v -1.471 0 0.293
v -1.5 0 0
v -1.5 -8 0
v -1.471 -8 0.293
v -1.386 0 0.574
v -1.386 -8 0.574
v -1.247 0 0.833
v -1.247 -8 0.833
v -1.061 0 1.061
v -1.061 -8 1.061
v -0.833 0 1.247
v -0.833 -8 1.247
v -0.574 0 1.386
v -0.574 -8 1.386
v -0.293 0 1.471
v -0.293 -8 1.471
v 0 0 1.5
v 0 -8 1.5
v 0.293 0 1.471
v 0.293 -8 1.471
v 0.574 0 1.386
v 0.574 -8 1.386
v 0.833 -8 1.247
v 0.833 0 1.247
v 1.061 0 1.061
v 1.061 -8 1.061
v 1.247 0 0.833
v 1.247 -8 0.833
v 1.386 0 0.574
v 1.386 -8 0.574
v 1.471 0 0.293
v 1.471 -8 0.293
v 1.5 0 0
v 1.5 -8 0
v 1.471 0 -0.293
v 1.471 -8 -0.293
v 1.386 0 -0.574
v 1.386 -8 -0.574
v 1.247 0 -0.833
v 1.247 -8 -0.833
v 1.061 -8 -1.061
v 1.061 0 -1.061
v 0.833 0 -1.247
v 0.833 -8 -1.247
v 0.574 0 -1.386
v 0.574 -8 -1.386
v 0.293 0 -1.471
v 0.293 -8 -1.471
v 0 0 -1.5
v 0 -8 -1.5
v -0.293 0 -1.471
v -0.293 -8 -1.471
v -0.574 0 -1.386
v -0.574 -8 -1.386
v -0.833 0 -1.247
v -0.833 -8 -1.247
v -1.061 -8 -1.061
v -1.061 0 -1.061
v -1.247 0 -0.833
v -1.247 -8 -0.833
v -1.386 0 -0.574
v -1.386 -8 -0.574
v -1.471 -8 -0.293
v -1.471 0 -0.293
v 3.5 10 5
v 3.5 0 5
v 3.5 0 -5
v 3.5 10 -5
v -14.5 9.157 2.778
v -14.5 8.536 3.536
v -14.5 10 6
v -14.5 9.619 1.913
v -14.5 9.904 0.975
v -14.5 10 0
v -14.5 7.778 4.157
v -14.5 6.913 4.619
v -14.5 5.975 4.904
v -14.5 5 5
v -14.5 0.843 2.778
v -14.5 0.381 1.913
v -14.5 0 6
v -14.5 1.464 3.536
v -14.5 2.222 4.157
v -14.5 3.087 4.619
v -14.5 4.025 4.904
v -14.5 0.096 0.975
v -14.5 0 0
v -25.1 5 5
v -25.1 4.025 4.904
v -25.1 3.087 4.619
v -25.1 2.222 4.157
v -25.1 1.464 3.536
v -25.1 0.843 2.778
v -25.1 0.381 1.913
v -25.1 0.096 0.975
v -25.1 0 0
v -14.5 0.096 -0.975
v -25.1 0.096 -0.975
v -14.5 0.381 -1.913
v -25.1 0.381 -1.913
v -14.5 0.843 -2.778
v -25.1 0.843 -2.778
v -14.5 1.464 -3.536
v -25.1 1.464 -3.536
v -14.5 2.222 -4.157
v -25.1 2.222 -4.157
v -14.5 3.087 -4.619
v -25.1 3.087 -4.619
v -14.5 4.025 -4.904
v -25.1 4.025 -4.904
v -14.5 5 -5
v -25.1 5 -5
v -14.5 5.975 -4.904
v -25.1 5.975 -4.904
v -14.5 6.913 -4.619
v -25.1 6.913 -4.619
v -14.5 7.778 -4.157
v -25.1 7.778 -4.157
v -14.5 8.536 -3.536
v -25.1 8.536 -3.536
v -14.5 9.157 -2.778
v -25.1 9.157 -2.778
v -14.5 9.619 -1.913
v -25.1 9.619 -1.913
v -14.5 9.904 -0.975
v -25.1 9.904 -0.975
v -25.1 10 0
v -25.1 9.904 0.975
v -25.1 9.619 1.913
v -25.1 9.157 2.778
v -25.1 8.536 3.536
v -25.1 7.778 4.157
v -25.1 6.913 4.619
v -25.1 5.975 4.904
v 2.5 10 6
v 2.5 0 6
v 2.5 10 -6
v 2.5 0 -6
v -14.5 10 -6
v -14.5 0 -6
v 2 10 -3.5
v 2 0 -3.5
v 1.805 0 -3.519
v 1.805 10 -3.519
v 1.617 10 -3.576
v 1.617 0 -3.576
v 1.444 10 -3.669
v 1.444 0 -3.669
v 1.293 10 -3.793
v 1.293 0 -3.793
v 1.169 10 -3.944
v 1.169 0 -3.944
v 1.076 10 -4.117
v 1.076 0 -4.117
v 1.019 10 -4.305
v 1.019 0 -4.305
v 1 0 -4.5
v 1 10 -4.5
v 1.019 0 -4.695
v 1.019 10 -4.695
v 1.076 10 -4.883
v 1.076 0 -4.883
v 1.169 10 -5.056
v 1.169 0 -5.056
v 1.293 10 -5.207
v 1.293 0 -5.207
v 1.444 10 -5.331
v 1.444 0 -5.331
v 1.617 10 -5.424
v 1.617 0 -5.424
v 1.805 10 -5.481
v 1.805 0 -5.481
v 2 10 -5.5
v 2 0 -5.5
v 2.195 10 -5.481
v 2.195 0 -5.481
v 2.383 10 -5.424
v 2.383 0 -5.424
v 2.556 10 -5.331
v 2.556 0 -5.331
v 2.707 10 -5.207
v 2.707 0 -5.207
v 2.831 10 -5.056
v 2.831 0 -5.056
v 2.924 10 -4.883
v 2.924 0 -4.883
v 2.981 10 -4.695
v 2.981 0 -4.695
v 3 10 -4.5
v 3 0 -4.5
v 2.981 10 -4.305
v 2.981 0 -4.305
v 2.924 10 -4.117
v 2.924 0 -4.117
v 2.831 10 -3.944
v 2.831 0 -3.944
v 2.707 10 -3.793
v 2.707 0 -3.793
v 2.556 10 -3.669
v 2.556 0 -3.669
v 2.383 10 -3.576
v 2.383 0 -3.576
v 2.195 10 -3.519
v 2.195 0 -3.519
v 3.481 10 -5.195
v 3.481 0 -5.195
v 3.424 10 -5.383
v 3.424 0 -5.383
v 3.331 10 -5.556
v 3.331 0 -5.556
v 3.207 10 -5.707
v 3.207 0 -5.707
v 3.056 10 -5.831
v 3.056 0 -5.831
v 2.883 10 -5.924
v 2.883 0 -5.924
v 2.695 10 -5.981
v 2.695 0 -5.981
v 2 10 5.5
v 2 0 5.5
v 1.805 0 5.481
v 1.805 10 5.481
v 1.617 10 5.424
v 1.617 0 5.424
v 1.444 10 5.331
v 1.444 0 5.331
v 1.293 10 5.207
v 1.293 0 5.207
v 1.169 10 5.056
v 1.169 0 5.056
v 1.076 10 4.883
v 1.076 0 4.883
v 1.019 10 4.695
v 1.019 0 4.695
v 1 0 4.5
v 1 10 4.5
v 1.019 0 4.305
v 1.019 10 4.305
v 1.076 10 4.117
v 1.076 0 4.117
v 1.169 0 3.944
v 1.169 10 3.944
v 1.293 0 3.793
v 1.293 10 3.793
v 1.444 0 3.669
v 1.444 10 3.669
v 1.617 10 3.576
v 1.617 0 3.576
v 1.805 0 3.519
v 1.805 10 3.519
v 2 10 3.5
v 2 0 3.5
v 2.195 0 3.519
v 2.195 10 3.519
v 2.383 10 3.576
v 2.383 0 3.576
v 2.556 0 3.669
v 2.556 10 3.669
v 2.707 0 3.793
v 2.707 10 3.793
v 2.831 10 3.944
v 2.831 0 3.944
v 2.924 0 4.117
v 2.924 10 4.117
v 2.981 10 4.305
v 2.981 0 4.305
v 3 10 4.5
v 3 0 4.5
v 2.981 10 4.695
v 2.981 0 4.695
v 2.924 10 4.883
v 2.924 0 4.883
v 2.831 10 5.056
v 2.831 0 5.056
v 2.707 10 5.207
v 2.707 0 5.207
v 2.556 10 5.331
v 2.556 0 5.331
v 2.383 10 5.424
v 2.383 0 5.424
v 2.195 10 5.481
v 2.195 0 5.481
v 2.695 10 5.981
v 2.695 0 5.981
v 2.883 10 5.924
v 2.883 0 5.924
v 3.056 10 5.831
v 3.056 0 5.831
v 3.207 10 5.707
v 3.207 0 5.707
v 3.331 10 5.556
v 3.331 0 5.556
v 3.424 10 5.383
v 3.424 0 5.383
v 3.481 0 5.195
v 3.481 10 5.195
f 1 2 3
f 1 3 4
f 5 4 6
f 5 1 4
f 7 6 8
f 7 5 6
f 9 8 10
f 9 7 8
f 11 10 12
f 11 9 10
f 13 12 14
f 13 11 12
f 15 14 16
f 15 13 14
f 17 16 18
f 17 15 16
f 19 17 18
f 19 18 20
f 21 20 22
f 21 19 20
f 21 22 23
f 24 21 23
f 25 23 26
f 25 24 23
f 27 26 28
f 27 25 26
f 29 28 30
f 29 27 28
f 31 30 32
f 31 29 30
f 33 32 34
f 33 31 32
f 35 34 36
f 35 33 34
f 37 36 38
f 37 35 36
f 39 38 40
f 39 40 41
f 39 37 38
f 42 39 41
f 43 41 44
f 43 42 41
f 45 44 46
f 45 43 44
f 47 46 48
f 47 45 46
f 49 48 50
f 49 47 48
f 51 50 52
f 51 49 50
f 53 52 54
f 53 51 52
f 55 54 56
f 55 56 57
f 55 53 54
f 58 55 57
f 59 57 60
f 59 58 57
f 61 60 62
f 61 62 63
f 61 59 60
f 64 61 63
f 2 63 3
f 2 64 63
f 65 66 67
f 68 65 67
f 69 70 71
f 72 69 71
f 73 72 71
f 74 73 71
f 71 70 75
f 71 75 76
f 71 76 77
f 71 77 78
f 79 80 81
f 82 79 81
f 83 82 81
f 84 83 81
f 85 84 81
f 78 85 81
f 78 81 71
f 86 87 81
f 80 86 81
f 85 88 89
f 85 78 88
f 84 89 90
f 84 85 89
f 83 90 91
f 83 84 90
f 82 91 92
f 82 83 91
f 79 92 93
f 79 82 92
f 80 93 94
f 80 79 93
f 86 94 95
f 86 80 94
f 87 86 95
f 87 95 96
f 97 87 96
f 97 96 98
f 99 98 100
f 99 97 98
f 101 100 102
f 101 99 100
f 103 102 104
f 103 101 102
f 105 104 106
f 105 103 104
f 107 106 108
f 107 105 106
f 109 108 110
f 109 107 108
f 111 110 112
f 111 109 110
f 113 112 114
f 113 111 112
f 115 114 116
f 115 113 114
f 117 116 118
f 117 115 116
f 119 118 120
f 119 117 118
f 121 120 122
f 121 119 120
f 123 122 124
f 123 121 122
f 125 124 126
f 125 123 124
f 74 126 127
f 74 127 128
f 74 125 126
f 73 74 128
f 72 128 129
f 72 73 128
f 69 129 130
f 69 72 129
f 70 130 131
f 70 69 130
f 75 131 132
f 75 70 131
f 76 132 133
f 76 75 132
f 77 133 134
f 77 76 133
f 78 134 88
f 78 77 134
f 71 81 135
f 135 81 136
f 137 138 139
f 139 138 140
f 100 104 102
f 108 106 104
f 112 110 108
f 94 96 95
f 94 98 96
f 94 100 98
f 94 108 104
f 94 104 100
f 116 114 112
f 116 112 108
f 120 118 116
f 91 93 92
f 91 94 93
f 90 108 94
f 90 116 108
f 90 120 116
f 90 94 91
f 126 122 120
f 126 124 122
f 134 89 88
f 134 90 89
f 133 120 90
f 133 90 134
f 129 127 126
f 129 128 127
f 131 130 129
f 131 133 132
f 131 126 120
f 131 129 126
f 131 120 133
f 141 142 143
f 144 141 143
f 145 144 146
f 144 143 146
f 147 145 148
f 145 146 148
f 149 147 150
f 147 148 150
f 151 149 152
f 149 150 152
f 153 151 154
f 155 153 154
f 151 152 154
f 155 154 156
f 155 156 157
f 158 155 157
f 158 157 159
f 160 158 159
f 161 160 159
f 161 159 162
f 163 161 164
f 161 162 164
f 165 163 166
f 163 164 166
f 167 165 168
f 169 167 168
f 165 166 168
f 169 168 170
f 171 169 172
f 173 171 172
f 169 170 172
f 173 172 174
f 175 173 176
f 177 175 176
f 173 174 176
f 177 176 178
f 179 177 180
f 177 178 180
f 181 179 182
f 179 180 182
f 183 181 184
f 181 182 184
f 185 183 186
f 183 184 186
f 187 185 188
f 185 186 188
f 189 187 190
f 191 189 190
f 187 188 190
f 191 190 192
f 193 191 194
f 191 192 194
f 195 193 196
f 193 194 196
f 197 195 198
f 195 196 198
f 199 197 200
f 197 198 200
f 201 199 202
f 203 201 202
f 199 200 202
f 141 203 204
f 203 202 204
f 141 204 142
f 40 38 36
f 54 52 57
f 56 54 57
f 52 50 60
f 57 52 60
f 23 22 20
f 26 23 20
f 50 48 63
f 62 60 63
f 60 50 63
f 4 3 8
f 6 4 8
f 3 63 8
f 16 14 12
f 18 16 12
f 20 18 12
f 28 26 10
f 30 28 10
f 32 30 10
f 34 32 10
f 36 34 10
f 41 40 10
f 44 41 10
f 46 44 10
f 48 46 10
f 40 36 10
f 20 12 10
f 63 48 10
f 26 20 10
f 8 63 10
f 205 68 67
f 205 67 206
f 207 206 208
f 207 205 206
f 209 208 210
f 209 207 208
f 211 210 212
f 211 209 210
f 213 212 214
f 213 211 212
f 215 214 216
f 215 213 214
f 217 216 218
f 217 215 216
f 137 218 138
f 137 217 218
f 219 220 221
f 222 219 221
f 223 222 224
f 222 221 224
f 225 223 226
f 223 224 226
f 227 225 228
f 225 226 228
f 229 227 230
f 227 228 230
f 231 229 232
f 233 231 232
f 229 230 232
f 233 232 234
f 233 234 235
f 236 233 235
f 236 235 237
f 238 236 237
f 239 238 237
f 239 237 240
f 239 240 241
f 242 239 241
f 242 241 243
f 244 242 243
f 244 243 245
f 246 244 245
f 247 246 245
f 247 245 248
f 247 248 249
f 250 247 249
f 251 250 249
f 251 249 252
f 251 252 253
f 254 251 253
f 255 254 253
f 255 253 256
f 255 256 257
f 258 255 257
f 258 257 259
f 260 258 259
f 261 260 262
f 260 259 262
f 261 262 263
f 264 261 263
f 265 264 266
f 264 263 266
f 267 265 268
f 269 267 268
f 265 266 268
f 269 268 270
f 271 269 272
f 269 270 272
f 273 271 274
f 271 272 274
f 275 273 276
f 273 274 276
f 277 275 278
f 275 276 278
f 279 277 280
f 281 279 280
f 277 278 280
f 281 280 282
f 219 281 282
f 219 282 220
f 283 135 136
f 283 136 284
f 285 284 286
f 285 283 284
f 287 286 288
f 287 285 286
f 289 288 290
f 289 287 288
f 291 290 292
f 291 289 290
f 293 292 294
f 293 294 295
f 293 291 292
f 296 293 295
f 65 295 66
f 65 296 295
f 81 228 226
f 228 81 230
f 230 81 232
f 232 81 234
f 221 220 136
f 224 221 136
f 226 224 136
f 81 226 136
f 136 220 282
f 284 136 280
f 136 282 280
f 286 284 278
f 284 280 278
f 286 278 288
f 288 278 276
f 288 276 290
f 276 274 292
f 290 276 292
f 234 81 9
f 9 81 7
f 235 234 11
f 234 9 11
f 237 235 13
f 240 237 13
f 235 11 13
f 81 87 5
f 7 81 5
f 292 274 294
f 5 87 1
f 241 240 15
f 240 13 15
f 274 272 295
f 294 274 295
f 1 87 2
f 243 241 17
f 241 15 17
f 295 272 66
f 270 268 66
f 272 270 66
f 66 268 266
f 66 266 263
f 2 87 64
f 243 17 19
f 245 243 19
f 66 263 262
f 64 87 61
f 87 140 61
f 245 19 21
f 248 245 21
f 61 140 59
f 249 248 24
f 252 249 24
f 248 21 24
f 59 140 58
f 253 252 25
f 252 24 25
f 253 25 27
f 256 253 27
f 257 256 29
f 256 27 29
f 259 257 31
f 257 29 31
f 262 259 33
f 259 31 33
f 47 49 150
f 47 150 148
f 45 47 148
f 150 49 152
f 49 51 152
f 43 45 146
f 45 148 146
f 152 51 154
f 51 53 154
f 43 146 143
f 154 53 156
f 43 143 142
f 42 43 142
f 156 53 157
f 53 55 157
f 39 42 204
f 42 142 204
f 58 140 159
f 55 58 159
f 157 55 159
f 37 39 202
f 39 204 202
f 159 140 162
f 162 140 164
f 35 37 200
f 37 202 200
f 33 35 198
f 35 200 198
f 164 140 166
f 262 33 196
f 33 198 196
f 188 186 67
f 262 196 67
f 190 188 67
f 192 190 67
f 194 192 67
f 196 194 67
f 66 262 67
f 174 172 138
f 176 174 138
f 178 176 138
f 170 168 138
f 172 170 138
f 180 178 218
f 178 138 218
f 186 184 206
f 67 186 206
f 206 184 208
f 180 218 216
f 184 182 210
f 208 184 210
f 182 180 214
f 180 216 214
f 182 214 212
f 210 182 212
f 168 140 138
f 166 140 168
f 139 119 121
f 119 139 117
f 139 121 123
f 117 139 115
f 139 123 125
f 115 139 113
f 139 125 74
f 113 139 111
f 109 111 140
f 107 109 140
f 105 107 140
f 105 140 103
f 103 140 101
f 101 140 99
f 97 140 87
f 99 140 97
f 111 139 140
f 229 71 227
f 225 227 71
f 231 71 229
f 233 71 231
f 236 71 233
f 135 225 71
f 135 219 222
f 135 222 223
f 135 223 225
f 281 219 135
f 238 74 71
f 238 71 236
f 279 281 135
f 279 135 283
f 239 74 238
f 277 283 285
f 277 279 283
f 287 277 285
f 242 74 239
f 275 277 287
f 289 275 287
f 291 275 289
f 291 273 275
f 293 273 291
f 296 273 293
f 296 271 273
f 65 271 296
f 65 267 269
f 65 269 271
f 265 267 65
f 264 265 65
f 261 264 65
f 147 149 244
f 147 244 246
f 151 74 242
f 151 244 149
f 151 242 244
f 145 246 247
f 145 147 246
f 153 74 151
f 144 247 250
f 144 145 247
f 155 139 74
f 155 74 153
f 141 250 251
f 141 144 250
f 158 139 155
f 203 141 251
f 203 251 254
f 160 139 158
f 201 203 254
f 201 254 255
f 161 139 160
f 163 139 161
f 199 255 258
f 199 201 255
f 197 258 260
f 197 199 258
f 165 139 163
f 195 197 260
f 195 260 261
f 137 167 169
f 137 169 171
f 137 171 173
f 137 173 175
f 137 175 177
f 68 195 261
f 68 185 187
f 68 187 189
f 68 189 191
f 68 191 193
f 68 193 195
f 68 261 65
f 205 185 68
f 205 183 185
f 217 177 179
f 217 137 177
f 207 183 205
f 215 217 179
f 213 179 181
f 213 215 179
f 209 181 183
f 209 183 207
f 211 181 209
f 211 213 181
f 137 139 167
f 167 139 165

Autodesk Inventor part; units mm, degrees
ref_plane "YZ Plane" through (0, 0, 0) normal (1, 0, 0) x (0, 1, 0)
ref_plane "XZ Plane" through (0, 0, 0) normal (0, 1, 0) x (-1, 0, 0)
ref_plane "XY Plane" through (0, 0, 0) normal (0, 0, 1) x (1, 0, 0)
sketch "Sketch1" plane through (0, 0, 0) normal (0, 1, 0) x (-1, 0, 0)
  circle A0 centre (0, 0) radius 1.5
  dimension "d0" = 3
extrude "Extrusion1" add sketch "Sketch1" against normal blind 8
sketch "Sketch2" plane through (0, 0, 0) normal (0, 1, 0) x (1, 0, 0)
  line L0 (-14.5, -6) -> (3.5, -6)
  line L1 (3.5, -6) -> (3.5, 6)
  line L2 (3.5, 6) -> (-14.5, 6)
  line L3 (-14.5, 6) -> (-14.5, -6)
  line L4 (-14.5, -6) -> (3.5, 6) construction
  line L5 (3.5, -6) -> (-14.5, 6) construction
  point P0 (0, 0)
  point P1 (-5.5, 0)
  point P2 (-5.5, 0)
  dimension "d3" = 18
  dimension "d4" = 12
  dimension "d5" = 3.5
extrude "Extrusion2" add sketch "Sketch2" along normal blind 10
sketch "Sketch3" plane through (-14.5, 0, -6) normal (-1, 0, 0) x (0, 0, 1)
  line L0 (0, 0) -> (12, 0) projected
  line L1 (12, 0) -> (12, 10) projected
  line L2 (0, 10) -> (12, 10) projected
  line L3 (0, 0) -> (0, 10) projected
  circle A0 centre (6, 5) radius 5
  point P0 (6, 0)
  point P1 (0, 5)
  point P2 (6, 10)
  dimension "d8" = 10
extrude "Extrusion3" add sketch "Sketch3" along normal blind 10.6 contours A0
fillet "Fillet1" radius 1 2 edges at (3.5, 5, -6) (3.5, 5, 6)
sketch "Sketch4" plane through (0, 10, 0) normal (0, 1, 0) x (1, 0, 0)
  line L0 (2.5, 6) -> (-14.5, 6) projected
  line L1 (-14.5, -6) -> (2.5, -6) projected
  line L2 (3.5, -5) -> (3.5, 5) projected
  point P0 (0, 0)
  point P1 (2, 4.5)
  point P2 (2, -4.5)
  dimension "d12" = 1.5
  dimension "d13" = 1.5
  dimension "d14" = 1.5
hole "Hole1" at (2, 10, -4.5) at (2, 10, 4.5) direction (0, -1, 0) diameter 2 end through all
equation "\"d13\" = d12"
equation "\"d14\" = d12"
properties part number "MotorRightAngle"
